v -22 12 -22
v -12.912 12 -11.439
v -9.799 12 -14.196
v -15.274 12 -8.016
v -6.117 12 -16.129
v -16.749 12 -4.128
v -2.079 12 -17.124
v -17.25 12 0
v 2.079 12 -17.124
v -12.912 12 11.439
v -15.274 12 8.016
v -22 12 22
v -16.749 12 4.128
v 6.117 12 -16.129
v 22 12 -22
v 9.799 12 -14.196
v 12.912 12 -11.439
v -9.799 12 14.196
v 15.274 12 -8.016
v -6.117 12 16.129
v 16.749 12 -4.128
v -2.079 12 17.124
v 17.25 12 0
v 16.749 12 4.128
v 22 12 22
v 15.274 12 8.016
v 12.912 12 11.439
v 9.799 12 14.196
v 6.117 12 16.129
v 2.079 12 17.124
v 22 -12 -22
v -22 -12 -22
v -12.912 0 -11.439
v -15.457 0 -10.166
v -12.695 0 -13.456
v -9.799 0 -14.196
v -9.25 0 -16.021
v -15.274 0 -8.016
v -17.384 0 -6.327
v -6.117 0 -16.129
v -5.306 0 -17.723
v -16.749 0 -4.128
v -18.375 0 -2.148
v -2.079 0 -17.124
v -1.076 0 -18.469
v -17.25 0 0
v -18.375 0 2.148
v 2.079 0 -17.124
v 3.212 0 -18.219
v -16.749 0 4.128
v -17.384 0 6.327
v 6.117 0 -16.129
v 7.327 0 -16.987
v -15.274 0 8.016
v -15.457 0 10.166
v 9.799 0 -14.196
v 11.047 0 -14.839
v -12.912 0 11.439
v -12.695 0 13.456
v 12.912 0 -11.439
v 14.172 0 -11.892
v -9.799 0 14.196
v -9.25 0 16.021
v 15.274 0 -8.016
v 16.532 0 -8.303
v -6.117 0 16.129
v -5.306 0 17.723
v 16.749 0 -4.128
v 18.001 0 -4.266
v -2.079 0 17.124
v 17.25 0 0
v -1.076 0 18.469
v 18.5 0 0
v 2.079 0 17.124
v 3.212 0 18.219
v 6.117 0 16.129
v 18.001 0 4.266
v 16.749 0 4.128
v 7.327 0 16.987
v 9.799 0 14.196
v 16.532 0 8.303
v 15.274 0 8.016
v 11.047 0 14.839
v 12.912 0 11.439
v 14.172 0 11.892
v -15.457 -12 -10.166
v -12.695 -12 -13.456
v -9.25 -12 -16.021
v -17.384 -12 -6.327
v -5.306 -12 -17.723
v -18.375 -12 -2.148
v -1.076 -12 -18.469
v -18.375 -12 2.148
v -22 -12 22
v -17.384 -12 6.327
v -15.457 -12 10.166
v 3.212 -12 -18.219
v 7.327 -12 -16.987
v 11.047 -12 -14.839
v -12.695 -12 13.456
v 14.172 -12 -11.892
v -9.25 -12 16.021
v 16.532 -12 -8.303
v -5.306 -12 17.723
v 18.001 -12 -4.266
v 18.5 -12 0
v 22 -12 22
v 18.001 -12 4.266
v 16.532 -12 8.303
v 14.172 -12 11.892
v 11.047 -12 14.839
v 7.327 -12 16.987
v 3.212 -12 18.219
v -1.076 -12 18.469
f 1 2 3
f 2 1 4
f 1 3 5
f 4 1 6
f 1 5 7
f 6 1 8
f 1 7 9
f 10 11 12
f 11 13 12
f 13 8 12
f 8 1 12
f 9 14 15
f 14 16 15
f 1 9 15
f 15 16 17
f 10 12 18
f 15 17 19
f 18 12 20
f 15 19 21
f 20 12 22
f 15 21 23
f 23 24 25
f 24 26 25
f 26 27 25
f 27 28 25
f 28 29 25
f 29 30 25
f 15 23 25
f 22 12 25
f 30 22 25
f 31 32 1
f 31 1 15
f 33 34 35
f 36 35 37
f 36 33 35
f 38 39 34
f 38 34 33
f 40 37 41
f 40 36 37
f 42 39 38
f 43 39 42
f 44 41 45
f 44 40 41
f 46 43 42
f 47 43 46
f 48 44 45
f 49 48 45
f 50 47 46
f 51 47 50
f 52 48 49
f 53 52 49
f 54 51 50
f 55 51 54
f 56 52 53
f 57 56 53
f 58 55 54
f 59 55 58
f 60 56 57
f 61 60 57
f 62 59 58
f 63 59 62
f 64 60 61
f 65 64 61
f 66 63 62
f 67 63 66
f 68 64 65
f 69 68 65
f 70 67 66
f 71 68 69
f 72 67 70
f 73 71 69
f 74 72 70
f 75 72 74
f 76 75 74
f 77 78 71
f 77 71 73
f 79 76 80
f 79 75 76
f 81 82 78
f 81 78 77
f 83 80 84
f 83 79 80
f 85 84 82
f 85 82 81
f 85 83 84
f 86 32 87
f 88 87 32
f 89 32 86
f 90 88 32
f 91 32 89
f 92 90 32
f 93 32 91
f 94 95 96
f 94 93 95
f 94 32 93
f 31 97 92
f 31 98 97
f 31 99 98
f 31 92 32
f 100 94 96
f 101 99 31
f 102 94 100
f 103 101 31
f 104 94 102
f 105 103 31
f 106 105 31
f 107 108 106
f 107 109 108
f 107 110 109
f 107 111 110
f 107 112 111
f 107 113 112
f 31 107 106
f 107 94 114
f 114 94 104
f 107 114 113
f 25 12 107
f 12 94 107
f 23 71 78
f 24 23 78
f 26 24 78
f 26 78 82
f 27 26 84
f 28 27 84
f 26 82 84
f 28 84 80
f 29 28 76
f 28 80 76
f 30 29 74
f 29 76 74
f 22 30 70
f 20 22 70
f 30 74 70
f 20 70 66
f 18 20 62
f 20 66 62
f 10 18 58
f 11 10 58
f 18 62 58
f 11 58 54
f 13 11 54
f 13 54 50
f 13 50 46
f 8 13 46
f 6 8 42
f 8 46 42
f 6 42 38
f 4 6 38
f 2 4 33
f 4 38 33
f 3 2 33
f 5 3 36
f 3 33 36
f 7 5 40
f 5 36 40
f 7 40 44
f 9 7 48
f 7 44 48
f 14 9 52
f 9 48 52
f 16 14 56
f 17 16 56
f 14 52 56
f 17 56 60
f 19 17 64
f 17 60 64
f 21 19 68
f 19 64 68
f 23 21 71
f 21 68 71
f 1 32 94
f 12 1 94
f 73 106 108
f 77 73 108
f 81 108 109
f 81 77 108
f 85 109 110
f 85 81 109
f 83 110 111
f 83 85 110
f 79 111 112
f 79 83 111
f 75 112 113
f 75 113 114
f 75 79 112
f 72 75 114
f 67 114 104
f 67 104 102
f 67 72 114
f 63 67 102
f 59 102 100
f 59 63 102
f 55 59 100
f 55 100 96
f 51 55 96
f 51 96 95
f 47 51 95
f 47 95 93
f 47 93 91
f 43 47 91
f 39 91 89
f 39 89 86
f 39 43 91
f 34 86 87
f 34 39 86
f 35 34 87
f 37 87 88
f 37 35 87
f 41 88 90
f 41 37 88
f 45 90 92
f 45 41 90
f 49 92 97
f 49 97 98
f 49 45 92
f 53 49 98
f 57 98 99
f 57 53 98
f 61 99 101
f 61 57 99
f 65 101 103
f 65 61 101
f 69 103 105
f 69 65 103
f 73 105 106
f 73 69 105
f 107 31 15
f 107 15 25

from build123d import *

# Parameters (mm, degrees)
F0_W     = 44
F0_H     = 44
F0_R     = 18.5
F1_DEPTH = 12
F2_W     = 44
F2_H     = 44
F2_R     = 17.25
F3_DEPTH = 12


# Not quite as in the source:
# - a feature names something its author has since deleted; it is built from what else it names


with BuildPart() as f1:
    # F0 (on Front) → F1 (new body)
    with BuildSketch(Plane.XZ):
        Rectangle(F0_W, F0_H)
        Circle(F0_R, mode=Mode.SUBTRACT)
    extrude(amount=F1_DEPTH)

    # F2 (on Front) → F3 (join)
    with BuildSketch(Plane.XZ):
        Rectangle(F2_W, F2_H)
        Circle(F2_R, mode=Mode.SUBTRACT)
    extrude(amount=-F3_DEPTH)


solid = f1.part
